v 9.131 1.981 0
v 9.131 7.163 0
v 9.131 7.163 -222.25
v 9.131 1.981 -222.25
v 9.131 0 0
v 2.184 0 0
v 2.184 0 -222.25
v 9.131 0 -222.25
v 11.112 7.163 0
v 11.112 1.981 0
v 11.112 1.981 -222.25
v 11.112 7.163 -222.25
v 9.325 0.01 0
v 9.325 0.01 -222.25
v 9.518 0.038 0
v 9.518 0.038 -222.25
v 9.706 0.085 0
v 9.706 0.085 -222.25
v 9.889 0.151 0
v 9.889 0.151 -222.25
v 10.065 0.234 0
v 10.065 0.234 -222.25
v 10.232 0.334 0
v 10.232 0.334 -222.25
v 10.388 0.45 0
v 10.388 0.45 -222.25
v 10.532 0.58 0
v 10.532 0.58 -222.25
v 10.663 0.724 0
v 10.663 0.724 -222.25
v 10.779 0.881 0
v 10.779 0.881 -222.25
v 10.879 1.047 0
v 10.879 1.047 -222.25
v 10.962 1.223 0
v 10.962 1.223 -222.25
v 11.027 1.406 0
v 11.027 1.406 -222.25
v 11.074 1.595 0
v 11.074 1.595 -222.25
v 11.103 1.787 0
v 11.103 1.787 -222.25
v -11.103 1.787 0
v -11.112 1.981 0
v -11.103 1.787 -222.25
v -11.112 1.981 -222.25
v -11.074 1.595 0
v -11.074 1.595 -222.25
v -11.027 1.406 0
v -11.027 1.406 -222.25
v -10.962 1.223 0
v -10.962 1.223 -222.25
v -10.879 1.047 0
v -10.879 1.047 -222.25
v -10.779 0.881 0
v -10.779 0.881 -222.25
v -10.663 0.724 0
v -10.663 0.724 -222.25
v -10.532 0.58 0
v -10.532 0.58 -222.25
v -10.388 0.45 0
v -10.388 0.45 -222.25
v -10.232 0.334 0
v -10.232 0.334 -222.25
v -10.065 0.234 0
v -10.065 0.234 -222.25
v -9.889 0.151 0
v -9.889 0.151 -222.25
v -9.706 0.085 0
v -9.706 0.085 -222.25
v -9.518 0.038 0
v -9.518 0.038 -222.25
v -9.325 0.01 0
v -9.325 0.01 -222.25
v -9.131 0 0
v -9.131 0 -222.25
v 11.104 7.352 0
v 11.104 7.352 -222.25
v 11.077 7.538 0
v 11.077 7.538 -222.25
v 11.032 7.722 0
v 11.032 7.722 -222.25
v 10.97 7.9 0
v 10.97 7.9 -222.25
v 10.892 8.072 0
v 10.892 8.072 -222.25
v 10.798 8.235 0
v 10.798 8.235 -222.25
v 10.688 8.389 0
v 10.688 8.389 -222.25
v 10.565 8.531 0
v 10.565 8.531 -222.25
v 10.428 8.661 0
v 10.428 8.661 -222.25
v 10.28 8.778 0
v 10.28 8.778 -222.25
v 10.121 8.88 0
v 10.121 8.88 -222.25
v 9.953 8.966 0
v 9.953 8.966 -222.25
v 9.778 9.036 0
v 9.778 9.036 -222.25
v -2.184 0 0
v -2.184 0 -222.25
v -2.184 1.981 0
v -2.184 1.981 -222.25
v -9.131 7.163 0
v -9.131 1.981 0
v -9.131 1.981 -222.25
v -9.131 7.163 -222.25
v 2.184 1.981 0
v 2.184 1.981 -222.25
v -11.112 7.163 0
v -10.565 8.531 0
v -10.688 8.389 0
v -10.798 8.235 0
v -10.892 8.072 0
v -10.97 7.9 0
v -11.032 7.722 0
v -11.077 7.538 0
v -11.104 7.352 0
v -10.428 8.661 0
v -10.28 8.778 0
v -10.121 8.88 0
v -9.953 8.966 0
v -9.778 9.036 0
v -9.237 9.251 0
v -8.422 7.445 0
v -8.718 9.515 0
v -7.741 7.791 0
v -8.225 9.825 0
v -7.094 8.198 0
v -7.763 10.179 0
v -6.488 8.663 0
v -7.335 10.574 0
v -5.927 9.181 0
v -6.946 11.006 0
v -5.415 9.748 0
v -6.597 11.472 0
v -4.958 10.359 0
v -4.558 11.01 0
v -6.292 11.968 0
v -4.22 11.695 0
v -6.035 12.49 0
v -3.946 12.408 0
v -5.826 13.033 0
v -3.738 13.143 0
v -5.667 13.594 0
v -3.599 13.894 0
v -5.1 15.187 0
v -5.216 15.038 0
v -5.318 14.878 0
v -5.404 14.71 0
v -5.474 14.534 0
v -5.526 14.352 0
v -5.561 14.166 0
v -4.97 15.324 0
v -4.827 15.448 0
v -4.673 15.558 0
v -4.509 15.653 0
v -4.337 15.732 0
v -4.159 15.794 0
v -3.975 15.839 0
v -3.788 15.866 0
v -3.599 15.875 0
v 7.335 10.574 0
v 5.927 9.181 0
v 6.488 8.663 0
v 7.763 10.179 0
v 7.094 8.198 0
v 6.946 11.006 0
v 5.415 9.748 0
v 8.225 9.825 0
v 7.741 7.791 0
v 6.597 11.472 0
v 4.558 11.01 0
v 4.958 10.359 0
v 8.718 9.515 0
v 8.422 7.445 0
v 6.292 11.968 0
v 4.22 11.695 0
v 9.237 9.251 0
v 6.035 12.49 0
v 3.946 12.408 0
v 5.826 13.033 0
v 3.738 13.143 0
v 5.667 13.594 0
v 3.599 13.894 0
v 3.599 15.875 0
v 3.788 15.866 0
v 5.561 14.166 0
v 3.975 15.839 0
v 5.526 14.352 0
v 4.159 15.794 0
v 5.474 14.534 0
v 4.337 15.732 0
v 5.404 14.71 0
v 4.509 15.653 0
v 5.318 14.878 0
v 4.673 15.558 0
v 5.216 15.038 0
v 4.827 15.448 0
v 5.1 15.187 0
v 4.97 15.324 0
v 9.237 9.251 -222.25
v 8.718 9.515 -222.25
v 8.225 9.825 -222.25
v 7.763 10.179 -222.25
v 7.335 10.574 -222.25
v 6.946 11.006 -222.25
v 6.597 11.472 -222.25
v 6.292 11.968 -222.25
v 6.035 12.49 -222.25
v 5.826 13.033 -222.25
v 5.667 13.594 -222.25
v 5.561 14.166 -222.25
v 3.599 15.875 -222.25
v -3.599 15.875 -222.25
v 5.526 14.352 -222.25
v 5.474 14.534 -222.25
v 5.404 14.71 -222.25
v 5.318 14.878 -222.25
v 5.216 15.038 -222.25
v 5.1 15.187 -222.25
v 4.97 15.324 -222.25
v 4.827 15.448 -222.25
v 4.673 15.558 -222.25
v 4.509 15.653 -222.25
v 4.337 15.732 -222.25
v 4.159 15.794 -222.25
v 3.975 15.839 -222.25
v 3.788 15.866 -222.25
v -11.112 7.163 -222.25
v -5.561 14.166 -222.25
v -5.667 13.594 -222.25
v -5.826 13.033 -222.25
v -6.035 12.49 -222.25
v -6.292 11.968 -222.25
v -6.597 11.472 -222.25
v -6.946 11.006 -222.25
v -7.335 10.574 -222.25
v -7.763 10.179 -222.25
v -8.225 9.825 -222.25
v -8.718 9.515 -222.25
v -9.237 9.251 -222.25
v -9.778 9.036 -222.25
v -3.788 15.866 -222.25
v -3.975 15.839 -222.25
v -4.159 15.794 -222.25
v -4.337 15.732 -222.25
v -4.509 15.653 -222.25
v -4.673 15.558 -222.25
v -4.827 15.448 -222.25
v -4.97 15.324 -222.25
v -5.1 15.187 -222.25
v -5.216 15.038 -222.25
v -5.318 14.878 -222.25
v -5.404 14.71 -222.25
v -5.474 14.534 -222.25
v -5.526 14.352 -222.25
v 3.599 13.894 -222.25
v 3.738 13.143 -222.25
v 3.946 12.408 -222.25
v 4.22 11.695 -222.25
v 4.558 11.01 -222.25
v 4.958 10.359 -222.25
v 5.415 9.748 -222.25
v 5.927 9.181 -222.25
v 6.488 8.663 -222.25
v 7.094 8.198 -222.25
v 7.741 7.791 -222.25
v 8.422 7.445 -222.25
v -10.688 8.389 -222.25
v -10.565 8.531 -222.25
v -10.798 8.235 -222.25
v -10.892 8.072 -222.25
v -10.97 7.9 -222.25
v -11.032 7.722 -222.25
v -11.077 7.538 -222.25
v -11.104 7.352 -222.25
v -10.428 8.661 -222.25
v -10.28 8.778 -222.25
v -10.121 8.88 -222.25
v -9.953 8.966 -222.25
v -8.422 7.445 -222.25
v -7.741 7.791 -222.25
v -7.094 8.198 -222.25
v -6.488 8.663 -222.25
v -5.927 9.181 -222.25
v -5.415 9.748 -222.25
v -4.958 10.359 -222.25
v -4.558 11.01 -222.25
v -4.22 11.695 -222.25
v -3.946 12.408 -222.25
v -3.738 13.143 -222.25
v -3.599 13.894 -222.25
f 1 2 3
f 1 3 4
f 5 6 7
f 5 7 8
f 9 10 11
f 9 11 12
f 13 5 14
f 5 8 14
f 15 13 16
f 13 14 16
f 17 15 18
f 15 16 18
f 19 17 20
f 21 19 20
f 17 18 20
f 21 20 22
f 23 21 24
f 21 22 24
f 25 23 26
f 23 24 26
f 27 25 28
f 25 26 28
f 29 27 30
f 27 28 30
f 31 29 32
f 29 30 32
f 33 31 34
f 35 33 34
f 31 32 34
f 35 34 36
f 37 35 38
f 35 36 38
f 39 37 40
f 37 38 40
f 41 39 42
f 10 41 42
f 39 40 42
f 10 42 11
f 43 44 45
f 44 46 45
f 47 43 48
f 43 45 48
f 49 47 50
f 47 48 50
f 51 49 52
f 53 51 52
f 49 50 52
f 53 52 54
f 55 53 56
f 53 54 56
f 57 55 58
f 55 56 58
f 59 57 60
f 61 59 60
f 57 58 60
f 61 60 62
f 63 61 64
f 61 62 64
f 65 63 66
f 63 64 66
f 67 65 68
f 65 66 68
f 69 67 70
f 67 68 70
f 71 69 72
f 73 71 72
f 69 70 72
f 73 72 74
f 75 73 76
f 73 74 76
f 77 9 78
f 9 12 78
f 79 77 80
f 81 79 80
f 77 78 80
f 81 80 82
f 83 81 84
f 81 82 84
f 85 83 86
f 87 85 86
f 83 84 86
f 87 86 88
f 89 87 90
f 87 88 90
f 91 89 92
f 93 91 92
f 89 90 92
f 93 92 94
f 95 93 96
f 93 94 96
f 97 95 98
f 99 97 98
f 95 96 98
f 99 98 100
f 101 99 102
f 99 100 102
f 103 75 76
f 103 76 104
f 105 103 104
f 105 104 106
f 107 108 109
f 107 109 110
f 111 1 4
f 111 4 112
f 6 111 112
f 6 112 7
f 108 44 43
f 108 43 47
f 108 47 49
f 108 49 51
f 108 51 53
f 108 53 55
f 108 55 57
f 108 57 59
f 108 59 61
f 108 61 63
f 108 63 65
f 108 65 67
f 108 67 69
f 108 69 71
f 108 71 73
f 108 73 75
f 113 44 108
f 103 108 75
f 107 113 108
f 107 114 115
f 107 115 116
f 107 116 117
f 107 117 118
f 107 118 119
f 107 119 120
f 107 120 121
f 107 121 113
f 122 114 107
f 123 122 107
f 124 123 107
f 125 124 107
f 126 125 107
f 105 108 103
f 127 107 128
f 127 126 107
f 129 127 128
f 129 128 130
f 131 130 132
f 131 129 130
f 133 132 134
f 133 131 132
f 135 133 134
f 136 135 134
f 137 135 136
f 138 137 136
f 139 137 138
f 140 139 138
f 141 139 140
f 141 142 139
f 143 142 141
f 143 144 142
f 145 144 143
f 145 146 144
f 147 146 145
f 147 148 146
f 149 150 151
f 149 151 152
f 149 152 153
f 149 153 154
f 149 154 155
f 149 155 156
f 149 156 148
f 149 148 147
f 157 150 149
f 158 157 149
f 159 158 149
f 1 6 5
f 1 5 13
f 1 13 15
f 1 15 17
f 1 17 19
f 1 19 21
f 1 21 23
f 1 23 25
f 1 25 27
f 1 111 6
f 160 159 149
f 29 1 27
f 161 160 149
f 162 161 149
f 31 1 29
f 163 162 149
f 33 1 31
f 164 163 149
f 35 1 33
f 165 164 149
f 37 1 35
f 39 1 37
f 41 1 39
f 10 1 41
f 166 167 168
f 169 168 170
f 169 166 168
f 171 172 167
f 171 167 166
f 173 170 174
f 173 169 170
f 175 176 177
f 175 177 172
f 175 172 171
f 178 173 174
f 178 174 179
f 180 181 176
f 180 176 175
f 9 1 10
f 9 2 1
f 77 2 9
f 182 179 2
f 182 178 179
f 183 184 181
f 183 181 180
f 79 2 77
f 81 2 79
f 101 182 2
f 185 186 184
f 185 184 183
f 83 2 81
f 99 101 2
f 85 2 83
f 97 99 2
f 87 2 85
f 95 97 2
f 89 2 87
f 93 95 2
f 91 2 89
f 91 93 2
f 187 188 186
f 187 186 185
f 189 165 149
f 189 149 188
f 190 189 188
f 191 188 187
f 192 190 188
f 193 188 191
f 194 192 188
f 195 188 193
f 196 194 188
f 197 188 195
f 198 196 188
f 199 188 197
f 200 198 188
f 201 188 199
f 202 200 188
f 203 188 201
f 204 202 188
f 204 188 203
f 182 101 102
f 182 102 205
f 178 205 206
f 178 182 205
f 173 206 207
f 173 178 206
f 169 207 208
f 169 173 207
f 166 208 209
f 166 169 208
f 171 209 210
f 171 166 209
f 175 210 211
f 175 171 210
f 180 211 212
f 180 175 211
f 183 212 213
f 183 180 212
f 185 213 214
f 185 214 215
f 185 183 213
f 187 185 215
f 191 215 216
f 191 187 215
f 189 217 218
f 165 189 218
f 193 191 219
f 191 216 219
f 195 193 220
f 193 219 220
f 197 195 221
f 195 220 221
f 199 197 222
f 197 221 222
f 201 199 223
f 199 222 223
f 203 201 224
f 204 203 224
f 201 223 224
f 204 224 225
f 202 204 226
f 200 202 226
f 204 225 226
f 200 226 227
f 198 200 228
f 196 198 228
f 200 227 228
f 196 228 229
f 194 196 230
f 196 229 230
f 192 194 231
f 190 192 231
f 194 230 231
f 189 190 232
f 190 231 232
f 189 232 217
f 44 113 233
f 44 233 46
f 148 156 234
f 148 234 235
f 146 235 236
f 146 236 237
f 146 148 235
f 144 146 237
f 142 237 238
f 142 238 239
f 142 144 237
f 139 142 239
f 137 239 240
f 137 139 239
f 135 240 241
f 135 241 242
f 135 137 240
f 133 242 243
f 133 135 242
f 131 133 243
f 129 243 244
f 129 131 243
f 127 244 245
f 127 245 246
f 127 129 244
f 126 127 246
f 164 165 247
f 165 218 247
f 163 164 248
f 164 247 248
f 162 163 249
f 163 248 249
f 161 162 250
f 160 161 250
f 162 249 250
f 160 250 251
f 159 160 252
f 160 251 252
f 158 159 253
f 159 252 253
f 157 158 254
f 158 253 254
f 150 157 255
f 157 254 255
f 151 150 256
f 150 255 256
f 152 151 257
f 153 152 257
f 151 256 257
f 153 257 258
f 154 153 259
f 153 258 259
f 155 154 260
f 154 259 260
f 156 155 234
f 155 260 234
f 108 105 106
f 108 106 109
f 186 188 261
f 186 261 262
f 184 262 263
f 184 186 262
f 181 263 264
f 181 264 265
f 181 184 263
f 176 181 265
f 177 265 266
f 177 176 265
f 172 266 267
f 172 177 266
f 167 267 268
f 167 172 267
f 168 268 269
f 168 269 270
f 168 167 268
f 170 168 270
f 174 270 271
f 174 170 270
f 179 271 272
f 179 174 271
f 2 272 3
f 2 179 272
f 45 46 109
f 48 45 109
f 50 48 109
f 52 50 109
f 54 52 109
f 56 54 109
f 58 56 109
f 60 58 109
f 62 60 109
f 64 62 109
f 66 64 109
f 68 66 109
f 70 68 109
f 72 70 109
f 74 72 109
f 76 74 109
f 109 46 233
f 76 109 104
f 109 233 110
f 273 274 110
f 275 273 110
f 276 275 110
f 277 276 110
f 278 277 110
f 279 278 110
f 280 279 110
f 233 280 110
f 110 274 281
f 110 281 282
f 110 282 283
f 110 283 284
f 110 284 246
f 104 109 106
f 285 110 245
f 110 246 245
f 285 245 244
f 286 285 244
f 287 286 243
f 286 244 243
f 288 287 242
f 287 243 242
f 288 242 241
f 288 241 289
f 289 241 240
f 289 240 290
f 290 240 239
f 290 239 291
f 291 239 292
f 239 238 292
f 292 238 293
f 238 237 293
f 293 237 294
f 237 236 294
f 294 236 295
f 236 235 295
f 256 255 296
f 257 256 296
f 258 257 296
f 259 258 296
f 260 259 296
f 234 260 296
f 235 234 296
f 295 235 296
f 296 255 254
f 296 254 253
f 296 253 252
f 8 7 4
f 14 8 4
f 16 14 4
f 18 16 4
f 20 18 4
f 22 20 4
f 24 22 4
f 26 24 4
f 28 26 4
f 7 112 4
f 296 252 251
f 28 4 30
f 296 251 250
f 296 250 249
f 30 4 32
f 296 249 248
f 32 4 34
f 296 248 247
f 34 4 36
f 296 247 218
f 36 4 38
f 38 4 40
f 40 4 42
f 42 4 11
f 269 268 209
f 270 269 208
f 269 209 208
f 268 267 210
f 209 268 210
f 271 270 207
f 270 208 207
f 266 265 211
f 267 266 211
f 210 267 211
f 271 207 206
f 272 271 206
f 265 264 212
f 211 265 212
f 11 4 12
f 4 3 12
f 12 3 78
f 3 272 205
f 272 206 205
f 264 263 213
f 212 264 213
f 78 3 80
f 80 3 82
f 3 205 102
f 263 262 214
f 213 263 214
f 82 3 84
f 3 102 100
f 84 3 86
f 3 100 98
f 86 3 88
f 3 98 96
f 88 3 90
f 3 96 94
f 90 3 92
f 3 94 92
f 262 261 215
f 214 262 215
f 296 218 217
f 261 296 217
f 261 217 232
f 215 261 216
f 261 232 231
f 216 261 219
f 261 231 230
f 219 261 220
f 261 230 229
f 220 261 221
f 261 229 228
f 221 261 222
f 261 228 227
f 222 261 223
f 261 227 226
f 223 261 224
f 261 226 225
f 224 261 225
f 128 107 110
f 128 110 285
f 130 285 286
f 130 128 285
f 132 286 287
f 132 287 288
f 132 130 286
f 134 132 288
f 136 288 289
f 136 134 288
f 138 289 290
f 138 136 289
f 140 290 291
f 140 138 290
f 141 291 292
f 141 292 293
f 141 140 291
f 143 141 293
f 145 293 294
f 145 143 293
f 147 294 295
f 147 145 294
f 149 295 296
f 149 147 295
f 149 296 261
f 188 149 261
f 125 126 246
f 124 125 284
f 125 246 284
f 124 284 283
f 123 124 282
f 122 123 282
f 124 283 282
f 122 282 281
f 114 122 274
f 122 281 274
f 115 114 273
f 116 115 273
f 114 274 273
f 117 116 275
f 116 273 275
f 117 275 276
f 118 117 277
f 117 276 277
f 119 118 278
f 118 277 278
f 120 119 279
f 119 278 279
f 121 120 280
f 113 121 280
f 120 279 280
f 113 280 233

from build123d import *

# Parameters (mm, degrees)
EXTRUDE_THIN1_DEPTH = 222.25
FILLET1_R           = 1.9812


with BuildPart() as part:
    # Sketch1 → Extrude-Thin1 (new body)
    with BuildSketch(Plane.XY):
        with BuildLine():
            Line((2.1844, 0), (11.1125, 0))
            Line((11.1125, 0), (11.1125, 8.73125))
            ThreePointArc((11.1125, 8.73125), (6.838482158, 11.13965279), (5.55625, 15.875))
            Line((5.55625, 15.875), (-5.55625, 15.875))
            ThreePointArc((-5.55625, 15.875), (-6.838482158, 11.13965279), (-11.1125, 8.73125))
            Line((-11.1125, 8.73125), (-11.1125, 0))
            Line((-11.1125, 0), (-2.1844, 0))
            Line((-2.1844, 0), (-2.1844, 1.9812))
            Line((-2.1844, 1.9812), (-9.1313, 1.9812))
            Line((-9.1313, 1.9812), (-9.1313, 7.163352557))
            ThreePointArc((-9.1313, 7.163352557), (-5.415045416, 9.747705801), (-3.598638875, 13.8938))
            Line((-3.598638875, 13.8938), (3.598638875, 13.8938))
            ThreePointArc((3.598638875, 13.8938), (5.415045416, 9.747705801), (9.1313, 7.163352557))
            Line((9.1313, 7.163352557), (9.1313, 1.9812))
            Line((9.1313, 1.9812), (2.1844, 1.9812))
            Line((2.1844, 1.9812), (2.1844, 0))
        make_face()
    extrude(amount=-EXTRUDE_THIN1_DEPTH)

    # Fillet1
    fillet1_edges = [part.edges().sort_by_distance(p)[0] for p in [
        (-11.1125, 0, -111.125),
        (-11.1125, 8.73125, -111.125),
        (-5.55625, 15.875, -111.125),
        (5.55625, 15.875, -111.125),
        (11.1125, 8.73125, -111.125),
        (11.1125, 0, -111.125),
    ]]
    fillet(fillet1_edges, radius=FILLET1_R)


solid = part.part
